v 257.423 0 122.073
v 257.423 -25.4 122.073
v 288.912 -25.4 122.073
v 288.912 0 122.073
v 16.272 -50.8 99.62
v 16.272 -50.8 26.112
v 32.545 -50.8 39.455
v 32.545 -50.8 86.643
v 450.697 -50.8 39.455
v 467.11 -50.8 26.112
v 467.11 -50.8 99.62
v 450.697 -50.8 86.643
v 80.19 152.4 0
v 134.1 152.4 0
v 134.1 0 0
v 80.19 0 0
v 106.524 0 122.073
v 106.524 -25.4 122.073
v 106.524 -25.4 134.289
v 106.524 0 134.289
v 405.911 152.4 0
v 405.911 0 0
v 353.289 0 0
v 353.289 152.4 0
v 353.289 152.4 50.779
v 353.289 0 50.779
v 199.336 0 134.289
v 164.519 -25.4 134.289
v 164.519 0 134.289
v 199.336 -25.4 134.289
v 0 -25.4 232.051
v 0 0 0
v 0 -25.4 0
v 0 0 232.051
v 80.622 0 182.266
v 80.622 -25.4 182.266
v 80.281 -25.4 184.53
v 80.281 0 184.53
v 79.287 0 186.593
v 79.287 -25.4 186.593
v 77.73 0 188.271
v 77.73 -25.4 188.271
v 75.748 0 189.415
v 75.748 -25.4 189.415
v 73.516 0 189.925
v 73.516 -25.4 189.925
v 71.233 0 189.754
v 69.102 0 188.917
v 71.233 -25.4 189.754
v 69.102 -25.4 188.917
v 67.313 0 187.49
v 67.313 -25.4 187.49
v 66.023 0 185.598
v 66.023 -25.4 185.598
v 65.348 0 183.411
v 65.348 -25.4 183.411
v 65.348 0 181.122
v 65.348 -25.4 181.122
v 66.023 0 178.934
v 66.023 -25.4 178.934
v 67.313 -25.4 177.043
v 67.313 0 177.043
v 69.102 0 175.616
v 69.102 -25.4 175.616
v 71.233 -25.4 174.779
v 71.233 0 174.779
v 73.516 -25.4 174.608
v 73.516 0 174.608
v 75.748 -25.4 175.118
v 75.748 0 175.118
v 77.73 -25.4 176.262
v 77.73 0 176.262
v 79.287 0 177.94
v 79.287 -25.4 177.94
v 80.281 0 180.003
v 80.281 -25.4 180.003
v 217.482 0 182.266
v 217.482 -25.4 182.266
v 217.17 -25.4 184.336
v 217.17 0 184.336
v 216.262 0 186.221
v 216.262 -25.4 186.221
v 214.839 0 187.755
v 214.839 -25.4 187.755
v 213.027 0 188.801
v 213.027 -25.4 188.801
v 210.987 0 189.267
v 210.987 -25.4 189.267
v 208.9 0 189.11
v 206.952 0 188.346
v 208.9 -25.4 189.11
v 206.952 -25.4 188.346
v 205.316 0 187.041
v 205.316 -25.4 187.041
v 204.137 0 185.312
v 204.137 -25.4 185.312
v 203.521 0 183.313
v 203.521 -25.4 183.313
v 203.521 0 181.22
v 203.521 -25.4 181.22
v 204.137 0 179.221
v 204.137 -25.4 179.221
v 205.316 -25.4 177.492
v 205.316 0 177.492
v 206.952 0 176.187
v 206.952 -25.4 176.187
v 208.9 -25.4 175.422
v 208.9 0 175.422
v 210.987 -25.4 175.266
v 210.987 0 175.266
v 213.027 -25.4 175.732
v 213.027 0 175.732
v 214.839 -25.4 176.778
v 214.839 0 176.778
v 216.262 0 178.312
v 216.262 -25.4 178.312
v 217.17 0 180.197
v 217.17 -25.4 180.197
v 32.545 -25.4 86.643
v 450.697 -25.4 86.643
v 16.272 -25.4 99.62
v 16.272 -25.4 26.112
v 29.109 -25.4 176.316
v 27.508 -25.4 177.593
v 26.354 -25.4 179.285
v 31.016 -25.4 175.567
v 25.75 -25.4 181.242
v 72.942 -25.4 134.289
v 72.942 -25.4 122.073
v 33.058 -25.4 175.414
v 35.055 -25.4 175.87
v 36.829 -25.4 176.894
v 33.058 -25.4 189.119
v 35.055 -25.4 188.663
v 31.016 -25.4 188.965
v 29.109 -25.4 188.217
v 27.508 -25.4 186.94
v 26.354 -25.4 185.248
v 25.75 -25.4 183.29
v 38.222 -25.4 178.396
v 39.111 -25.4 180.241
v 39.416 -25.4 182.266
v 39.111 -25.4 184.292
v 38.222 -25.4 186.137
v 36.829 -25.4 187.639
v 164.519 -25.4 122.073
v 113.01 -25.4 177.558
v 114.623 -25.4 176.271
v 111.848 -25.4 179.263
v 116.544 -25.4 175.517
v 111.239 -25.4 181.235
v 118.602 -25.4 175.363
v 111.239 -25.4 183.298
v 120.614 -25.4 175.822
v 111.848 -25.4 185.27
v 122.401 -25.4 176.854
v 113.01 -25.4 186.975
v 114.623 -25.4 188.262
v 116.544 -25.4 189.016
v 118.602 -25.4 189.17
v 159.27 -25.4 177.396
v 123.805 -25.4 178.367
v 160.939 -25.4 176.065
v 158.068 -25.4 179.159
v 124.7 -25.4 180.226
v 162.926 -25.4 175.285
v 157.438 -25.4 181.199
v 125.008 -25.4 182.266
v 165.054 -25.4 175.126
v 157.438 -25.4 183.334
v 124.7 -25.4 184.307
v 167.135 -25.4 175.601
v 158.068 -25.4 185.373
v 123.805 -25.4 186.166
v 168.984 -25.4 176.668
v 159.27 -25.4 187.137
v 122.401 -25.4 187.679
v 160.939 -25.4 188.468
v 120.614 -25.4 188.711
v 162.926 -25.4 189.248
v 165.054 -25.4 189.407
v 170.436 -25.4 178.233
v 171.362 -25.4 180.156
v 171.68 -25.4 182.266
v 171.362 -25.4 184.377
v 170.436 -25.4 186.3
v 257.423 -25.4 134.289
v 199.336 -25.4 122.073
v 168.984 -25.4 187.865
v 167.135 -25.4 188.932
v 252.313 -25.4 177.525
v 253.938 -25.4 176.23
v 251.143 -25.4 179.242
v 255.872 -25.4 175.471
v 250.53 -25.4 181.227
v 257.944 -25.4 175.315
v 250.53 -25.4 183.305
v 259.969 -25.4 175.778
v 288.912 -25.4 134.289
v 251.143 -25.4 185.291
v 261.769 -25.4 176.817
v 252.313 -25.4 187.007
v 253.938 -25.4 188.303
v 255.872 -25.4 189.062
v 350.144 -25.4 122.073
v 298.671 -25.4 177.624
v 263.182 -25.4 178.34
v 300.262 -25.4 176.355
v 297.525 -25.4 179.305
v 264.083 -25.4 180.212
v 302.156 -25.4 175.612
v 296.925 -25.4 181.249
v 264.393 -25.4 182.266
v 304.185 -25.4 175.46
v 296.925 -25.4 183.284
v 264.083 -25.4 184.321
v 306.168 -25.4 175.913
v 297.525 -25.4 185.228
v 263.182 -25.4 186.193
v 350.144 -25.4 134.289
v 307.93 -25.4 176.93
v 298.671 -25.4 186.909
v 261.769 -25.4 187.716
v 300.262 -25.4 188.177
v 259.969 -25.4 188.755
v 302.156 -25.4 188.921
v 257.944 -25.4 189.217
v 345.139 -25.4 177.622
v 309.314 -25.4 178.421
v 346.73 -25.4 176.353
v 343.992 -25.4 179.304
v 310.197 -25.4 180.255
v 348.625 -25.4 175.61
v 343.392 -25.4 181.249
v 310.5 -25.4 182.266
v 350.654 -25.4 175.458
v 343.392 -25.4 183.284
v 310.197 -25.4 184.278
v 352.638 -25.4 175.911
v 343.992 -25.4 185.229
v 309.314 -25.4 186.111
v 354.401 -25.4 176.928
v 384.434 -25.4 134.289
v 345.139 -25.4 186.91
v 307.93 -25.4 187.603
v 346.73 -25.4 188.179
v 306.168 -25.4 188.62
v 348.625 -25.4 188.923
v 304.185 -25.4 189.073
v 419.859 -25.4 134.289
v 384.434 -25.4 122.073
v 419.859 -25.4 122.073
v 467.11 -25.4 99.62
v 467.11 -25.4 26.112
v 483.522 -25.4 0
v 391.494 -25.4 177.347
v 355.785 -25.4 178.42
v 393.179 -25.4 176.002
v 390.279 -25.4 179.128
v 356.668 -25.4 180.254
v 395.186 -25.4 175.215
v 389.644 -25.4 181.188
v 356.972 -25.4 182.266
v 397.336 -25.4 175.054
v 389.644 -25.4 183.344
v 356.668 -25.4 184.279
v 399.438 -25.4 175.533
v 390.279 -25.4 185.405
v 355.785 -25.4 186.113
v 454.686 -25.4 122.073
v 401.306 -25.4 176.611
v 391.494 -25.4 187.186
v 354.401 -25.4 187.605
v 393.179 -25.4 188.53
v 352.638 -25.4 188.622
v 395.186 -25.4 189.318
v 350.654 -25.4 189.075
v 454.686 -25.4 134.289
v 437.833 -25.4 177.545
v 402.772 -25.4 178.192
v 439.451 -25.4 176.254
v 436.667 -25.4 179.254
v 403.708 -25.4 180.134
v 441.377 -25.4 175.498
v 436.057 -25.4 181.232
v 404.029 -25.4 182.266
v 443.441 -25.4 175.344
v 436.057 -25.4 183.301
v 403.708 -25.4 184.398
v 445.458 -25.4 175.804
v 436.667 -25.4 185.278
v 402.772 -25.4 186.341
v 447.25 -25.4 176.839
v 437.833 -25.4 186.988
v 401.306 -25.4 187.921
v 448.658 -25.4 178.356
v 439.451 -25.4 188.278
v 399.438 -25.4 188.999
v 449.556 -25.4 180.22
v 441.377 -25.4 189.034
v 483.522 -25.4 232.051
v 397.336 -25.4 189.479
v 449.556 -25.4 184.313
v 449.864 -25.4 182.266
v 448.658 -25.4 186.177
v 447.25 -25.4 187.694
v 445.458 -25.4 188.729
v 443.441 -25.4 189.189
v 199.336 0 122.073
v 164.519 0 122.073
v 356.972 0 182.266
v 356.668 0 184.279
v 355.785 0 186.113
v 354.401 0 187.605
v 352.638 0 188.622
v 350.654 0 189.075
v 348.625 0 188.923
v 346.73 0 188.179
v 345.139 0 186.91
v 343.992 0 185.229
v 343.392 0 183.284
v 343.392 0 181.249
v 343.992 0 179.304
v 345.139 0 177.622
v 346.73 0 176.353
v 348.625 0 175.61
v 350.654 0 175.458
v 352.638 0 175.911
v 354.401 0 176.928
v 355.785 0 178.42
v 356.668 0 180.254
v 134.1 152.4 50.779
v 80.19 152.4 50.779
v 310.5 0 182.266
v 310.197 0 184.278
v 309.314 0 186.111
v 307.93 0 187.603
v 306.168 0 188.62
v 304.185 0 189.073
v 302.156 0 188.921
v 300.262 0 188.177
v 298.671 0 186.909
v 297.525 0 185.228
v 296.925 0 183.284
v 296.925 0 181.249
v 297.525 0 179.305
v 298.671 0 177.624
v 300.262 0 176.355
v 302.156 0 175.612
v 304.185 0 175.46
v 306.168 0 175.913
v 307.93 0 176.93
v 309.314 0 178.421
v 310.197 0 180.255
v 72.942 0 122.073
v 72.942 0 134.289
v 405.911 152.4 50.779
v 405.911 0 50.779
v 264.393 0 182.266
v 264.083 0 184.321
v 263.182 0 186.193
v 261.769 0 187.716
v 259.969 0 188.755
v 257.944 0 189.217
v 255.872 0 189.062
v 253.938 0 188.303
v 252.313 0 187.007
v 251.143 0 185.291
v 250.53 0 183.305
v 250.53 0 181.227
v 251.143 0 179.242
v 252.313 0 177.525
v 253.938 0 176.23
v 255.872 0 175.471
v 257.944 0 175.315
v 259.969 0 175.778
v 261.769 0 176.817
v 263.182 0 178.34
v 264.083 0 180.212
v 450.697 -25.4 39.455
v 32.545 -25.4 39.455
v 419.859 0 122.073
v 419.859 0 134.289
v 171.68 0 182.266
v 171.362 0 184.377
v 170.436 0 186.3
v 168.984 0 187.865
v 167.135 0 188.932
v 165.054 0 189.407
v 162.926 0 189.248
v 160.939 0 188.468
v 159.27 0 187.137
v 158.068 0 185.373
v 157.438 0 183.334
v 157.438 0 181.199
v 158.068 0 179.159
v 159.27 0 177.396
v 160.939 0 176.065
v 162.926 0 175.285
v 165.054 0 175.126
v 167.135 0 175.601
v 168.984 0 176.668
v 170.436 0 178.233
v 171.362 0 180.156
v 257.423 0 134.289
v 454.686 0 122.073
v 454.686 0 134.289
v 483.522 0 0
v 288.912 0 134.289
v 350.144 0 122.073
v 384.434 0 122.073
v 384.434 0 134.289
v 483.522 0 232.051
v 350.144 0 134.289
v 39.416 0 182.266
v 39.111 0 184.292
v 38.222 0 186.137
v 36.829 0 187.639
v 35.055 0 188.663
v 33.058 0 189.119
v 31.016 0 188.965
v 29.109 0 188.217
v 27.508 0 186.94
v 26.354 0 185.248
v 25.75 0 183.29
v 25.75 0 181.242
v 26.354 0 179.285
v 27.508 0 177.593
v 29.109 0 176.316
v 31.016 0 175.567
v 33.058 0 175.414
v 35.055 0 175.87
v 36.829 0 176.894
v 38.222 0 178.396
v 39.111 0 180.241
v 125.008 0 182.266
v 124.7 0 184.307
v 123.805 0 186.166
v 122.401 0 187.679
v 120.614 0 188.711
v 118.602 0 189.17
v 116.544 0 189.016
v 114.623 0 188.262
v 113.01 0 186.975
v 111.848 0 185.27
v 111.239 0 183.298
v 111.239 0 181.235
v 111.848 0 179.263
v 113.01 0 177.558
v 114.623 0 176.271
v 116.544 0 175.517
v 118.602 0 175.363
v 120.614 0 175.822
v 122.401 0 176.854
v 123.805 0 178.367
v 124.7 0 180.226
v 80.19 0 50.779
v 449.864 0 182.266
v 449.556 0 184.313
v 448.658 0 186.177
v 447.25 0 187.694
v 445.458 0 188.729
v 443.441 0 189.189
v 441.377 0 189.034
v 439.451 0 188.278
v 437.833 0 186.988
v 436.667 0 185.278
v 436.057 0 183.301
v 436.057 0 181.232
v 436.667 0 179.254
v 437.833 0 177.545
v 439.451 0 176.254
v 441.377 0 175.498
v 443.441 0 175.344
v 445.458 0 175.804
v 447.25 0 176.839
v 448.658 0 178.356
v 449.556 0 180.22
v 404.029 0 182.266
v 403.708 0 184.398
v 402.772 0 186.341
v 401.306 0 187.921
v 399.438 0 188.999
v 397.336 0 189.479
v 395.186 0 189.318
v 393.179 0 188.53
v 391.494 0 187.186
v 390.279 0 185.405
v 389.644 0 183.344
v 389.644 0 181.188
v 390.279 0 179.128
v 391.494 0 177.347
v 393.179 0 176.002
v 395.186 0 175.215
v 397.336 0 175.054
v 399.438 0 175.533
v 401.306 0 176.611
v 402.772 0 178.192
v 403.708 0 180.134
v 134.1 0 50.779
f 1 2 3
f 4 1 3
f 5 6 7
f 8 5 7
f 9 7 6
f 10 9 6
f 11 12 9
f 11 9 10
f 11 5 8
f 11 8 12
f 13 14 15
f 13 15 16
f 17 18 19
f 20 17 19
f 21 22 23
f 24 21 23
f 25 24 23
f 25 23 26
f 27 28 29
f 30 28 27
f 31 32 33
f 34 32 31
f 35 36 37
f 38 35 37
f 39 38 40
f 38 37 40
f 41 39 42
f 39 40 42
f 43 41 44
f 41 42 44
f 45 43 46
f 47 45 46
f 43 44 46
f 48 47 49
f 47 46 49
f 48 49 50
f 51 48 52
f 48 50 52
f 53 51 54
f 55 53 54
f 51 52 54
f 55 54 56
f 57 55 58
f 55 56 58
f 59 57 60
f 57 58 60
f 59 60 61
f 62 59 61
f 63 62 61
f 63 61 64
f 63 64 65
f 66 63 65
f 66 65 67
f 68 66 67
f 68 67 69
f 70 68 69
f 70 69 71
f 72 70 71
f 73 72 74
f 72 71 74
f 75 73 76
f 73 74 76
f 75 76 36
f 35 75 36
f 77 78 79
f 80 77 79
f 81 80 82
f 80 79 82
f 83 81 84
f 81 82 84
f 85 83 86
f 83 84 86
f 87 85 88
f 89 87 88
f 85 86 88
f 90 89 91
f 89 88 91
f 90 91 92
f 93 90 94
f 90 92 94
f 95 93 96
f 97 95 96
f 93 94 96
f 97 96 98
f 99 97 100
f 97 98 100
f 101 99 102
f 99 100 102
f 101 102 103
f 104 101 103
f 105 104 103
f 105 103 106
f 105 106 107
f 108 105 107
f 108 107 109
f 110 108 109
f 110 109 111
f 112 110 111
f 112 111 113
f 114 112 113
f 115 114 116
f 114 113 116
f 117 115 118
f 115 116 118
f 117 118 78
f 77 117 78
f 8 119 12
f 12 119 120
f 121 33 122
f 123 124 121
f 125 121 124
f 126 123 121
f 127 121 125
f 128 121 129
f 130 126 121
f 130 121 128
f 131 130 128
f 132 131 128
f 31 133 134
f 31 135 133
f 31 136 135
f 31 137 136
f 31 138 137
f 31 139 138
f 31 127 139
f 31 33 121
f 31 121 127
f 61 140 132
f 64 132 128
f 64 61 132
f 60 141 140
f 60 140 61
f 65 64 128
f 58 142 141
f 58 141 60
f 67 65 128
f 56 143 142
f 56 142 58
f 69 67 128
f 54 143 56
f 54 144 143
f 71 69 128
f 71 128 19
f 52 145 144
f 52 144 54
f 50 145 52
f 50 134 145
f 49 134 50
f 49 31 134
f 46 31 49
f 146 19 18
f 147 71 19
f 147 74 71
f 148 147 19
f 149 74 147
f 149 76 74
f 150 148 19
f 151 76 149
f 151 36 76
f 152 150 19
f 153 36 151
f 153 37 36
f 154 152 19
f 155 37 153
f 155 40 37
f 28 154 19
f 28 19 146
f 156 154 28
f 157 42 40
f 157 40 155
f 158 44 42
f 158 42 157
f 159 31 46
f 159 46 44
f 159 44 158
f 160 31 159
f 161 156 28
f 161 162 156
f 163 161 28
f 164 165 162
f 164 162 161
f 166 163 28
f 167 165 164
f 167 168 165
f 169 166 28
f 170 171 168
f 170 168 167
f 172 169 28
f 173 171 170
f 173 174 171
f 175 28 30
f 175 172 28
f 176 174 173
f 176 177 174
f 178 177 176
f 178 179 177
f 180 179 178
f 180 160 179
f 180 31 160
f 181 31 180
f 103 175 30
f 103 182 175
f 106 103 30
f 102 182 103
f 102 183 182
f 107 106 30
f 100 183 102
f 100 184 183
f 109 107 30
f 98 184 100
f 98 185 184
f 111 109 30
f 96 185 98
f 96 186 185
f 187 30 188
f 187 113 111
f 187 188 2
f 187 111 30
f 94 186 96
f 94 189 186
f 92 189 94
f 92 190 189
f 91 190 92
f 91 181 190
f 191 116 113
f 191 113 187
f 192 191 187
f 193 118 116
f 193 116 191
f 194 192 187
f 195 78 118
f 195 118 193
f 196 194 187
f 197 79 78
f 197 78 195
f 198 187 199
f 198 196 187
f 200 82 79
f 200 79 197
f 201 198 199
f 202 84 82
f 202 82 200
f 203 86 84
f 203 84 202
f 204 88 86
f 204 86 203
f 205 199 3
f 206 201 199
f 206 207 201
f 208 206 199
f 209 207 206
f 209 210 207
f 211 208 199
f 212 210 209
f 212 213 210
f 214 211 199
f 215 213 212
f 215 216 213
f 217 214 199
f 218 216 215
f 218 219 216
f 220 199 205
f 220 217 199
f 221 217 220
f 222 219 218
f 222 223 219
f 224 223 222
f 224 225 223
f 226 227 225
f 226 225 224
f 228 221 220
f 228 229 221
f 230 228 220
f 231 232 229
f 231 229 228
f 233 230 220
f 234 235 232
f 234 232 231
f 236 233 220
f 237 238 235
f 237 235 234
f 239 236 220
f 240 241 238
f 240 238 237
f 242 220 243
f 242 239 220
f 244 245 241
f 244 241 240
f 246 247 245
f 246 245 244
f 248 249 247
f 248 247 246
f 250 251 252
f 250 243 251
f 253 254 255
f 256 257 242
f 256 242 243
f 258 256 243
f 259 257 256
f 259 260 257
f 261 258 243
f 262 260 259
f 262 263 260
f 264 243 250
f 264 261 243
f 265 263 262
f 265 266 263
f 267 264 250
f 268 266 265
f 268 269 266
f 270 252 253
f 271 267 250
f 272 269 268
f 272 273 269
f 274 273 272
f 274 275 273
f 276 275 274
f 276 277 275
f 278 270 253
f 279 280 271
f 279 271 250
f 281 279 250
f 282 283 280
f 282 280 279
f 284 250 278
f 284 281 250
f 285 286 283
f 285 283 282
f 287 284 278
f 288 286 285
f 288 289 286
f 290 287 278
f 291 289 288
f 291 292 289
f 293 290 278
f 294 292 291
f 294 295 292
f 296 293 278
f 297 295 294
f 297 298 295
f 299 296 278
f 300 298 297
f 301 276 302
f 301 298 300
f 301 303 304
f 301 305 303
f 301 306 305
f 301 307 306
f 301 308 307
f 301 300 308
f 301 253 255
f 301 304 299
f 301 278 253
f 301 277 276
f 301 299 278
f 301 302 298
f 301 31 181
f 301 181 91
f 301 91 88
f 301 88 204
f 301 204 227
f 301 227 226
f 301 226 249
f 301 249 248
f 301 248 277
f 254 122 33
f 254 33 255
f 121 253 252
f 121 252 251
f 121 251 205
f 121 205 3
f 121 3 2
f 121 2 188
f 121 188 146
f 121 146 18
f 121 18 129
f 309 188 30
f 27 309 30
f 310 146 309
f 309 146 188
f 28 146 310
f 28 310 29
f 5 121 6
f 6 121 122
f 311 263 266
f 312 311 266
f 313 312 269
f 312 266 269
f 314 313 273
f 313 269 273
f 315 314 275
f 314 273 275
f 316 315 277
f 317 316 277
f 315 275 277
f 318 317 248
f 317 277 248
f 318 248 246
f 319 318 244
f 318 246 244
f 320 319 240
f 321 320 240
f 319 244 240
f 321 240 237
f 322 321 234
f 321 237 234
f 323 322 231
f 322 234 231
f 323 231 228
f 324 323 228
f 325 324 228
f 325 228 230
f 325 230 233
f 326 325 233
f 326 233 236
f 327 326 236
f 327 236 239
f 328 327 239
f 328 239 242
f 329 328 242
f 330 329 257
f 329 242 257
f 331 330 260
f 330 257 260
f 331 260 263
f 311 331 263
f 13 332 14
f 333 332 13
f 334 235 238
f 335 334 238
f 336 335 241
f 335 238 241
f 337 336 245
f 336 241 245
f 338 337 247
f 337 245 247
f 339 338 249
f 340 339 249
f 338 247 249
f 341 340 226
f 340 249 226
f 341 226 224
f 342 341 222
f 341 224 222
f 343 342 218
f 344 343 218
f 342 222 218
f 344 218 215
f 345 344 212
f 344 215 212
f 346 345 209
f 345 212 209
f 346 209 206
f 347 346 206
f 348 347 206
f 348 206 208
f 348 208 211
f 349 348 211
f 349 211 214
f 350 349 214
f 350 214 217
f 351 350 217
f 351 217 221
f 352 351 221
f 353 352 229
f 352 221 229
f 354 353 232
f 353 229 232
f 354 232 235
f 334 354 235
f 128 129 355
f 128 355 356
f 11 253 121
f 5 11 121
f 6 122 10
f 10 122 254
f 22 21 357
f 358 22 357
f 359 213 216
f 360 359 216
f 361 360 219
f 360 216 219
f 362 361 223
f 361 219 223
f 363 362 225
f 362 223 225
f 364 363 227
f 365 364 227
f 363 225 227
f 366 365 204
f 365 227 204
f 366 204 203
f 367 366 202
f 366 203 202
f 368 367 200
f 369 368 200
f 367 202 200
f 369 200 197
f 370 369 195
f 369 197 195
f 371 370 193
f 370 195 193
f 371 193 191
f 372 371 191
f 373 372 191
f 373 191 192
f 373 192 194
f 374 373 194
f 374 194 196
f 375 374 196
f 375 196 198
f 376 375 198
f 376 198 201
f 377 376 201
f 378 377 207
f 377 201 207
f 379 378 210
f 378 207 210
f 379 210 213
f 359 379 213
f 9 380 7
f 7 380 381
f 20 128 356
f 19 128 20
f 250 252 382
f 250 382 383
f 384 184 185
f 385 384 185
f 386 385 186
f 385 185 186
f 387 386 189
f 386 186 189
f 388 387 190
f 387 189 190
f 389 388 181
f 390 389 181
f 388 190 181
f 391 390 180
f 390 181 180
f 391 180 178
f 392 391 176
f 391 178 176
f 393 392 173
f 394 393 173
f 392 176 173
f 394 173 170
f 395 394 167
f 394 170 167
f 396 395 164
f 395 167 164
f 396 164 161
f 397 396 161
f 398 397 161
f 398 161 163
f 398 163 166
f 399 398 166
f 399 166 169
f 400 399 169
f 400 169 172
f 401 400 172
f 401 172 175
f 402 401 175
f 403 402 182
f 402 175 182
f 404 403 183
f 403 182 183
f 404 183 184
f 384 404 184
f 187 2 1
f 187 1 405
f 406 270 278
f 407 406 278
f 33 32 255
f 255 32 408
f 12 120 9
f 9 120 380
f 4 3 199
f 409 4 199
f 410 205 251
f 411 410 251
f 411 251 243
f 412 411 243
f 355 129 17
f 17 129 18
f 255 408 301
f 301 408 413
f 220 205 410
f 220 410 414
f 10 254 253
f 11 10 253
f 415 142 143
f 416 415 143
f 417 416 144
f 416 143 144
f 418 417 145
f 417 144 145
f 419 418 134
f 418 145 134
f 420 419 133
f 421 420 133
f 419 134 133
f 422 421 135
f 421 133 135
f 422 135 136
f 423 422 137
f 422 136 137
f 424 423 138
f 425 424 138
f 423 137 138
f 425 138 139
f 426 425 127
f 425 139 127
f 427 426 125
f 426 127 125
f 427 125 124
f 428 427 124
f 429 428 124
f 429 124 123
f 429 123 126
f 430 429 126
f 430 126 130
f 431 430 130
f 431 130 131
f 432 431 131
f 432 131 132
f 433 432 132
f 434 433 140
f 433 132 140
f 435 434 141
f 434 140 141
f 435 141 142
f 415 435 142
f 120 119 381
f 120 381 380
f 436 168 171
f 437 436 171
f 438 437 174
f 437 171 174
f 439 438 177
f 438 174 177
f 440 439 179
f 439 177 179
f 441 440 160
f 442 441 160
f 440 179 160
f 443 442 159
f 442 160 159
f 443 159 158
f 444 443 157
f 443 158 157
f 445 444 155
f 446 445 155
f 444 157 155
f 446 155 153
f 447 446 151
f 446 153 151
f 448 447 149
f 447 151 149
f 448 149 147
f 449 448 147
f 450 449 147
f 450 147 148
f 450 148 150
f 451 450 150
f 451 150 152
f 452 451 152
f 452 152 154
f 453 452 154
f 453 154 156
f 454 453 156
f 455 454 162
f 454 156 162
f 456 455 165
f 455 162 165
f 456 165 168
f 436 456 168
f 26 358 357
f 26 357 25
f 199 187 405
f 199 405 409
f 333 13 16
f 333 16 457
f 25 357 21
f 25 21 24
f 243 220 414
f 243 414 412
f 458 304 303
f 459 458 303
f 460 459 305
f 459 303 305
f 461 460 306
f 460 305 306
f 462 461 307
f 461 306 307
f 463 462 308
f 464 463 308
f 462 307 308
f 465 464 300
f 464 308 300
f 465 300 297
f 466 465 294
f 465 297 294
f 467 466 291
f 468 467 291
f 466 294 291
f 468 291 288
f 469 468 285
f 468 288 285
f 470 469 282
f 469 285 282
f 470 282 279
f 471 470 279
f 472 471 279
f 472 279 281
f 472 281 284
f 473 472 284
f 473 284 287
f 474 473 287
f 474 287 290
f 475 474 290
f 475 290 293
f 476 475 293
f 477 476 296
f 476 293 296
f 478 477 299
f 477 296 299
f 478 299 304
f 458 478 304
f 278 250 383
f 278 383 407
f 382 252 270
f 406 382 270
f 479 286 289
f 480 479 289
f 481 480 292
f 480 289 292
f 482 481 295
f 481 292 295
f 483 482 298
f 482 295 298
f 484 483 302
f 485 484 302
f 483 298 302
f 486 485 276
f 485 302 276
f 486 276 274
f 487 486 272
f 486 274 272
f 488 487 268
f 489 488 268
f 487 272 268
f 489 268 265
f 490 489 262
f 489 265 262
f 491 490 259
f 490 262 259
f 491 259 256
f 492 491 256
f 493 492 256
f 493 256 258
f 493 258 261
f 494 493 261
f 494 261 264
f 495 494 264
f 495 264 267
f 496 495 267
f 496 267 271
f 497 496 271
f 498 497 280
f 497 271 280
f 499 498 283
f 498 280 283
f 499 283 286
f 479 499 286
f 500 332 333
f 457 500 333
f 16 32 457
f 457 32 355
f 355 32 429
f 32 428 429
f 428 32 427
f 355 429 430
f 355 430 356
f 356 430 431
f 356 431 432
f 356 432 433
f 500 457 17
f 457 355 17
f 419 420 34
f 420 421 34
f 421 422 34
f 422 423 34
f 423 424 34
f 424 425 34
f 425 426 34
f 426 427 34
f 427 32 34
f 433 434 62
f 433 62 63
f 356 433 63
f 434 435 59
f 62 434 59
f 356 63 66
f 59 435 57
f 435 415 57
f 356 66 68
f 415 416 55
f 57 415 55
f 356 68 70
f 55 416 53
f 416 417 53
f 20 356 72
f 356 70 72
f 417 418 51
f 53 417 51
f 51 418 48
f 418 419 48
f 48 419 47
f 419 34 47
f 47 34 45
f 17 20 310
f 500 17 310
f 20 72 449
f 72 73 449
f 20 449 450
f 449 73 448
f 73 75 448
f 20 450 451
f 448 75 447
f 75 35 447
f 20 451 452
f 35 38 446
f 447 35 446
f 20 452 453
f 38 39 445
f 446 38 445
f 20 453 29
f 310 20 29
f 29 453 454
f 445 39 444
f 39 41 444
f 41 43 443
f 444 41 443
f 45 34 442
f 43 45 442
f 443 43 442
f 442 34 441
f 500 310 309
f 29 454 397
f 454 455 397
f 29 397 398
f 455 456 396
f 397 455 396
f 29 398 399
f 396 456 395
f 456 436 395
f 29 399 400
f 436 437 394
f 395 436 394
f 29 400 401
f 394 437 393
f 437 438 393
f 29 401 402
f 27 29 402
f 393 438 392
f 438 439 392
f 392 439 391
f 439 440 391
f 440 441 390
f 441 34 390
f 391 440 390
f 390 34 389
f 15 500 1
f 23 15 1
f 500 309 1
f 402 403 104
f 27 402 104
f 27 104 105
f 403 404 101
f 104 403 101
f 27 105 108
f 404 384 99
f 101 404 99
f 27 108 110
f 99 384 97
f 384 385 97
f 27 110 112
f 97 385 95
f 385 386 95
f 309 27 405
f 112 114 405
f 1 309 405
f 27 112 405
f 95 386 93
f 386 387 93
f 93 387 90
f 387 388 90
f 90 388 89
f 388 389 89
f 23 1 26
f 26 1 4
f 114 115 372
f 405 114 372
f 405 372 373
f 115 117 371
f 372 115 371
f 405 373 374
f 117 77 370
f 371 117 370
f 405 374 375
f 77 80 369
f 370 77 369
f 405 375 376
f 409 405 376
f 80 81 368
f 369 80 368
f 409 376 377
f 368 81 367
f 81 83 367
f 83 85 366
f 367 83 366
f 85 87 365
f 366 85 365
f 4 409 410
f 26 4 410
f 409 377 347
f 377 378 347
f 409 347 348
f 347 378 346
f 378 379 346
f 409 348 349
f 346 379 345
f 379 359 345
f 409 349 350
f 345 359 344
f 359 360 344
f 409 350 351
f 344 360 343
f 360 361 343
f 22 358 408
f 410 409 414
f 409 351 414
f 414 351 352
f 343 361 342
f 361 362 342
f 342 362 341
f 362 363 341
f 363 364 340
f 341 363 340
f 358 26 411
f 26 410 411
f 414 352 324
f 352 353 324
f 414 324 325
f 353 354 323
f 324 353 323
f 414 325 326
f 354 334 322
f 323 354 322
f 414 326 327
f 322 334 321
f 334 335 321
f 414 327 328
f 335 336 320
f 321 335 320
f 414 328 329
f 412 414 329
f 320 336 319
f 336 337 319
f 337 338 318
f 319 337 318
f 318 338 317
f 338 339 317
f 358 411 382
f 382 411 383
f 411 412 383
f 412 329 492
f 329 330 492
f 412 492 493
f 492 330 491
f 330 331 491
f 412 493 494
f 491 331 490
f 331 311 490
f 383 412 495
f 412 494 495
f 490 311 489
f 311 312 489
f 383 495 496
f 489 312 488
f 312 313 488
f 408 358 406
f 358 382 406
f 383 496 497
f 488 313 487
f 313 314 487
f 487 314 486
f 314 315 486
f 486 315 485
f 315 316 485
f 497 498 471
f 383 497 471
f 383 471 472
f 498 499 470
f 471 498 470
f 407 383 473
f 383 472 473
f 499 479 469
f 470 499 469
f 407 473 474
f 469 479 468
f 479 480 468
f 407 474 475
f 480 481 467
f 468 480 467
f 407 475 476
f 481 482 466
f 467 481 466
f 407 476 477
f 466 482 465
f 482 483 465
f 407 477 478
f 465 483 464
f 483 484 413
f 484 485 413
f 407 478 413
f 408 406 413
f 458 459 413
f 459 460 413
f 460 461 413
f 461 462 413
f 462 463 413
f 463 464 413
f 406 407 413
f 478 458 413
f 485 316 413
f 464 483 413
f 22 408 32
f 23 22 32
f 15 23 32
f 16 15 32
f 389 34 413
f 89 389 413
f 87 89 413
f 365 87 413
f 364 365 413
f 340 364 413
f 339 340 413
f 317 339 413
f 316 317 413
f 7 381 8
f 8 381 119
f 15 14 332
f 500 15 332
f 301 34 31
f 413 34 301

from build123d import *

# Parameters (mm, degrees)
F0_W     = 483.521879
F0_H     = 232.050955
F1_DEPTH = 25.4
F2_W     = 52.622199
F2_H     = 50.77935
F2_W_2   = 53.910152
F3_DEPTH = 152.4
F4_R     = 6.942146
F4_R_2   = 7.233065
F4_R_3   = 6.827798
F4_R_4   = 6.825473
F4_R_5   = 6.970363
F4_R_6   = 7.019906
F4_R_7   = 7.160675
F4_R_8   = 6.922756
F4_R_9   = 7.679718
F4_R_10  = 6.87136
F4_W     = 33.581532
F4_H     = 12.216136
F4_W_2   = 34.816921
F4_W_3   = 31.48967
F4_W_4   = 34.290463
F4_W_5   = 34.827173
F5_DEPTH = 25.4
F6_DEPTH = 25.4


with BuildPart() as f1:
    # F0 (on Front) → F1 (new body)
    with BuildSketch(Plane.XZ):
        with Locations((241.760939, 116.025477)):
            Rectangle(F0_W, F0_H)
    extrude(amount=F1_DEPTH)

    # F2 (on face) → F3 (join)
    with BuildSketch(Plane(origin=(0, 0, 0), x_dir=(-1, 0, 0), z_dir=(0, 1, 0))):
        with Locations((-379.599809, 25.389675)):
            Rectangle(F2_W, F2_H)
        with Locations((-107.145153, 25.389675)):
            Rectangle(F2_W_2, F2_H)
    extrude(amount=F3_DEPTH)

    # F4 (on face) → F5 (cut)
    with BuildSketch(Plane.XZ.offset(25.4)):
        with Locations((442.921937, 182.266369)):
            Circle(F4_R)
        with Locations((396.795809, 182.266369)):
            Circle(F4_R_2)
        with Locations((350.143939, 182.266369)):
            Circle(F4_R_3)
        with Locations((303.674549, 182.266369)):
            Circle(F4_R_4)
        with Locations((257.422805, 182.266369)):
            Circle(F4_R_5)
        with Locations((210.462064, 182.266369)):
            Circle(F4_R_6)
        with Locations((164.519146, 182.266369)):
            Circle(F4_R_7)
        with Locations((118.084826, 182.266369)):
            Circle(F4_R_8)
        with Locations((72.942153, 182.266369)):
            Circle(F4_R_9)
        with Locations((32.544691, 182.266369)):
            Circle(F4_R_10)
        with Locations((89.732919, 128.181107)):
            Rectangle(F4_W, F4_H)
        with Locations((181.927606, 128.181107)):
            Rectangle(F4_W_2, F4_H)
        with Locations((273.16764, 128.181107)):
            Rectangle(F4_W_3, F4_H)
        with Locations((367.28917, 128.181107)):
            Rectangle(F4_W_4, F4_H)
        with Locations((437.272459, 128.181107)):
            Rectangle(F4_W_5, F4_H)
    extrude(amount=-F5_DEPTH, mode=Mode.SUBTRACT)

    # F4 (on face) → F6 (join)
    with BuildSketch(Plane.XZ.offset(25.4)):
        Polygon((32.544691, 39.454777), (32.544691, 86.642593), (16.272346, 86.642593), (16.272346, 26.111573), (467.10965, 26.111573), (467.10965, 86.642593), (450.697422, 86.642593), (450.697422, 39.454777), align=None)
        Polygon((16.272346, 86.642593), (32.544691, 86.642593), (450.697422, 86.642593), (467.10965, 86.642593), (467.10965, 99.620059), (16.272346, 99.620059), align=None)
    extrude(amount=F6_DEPTH)


solid = f1.part
